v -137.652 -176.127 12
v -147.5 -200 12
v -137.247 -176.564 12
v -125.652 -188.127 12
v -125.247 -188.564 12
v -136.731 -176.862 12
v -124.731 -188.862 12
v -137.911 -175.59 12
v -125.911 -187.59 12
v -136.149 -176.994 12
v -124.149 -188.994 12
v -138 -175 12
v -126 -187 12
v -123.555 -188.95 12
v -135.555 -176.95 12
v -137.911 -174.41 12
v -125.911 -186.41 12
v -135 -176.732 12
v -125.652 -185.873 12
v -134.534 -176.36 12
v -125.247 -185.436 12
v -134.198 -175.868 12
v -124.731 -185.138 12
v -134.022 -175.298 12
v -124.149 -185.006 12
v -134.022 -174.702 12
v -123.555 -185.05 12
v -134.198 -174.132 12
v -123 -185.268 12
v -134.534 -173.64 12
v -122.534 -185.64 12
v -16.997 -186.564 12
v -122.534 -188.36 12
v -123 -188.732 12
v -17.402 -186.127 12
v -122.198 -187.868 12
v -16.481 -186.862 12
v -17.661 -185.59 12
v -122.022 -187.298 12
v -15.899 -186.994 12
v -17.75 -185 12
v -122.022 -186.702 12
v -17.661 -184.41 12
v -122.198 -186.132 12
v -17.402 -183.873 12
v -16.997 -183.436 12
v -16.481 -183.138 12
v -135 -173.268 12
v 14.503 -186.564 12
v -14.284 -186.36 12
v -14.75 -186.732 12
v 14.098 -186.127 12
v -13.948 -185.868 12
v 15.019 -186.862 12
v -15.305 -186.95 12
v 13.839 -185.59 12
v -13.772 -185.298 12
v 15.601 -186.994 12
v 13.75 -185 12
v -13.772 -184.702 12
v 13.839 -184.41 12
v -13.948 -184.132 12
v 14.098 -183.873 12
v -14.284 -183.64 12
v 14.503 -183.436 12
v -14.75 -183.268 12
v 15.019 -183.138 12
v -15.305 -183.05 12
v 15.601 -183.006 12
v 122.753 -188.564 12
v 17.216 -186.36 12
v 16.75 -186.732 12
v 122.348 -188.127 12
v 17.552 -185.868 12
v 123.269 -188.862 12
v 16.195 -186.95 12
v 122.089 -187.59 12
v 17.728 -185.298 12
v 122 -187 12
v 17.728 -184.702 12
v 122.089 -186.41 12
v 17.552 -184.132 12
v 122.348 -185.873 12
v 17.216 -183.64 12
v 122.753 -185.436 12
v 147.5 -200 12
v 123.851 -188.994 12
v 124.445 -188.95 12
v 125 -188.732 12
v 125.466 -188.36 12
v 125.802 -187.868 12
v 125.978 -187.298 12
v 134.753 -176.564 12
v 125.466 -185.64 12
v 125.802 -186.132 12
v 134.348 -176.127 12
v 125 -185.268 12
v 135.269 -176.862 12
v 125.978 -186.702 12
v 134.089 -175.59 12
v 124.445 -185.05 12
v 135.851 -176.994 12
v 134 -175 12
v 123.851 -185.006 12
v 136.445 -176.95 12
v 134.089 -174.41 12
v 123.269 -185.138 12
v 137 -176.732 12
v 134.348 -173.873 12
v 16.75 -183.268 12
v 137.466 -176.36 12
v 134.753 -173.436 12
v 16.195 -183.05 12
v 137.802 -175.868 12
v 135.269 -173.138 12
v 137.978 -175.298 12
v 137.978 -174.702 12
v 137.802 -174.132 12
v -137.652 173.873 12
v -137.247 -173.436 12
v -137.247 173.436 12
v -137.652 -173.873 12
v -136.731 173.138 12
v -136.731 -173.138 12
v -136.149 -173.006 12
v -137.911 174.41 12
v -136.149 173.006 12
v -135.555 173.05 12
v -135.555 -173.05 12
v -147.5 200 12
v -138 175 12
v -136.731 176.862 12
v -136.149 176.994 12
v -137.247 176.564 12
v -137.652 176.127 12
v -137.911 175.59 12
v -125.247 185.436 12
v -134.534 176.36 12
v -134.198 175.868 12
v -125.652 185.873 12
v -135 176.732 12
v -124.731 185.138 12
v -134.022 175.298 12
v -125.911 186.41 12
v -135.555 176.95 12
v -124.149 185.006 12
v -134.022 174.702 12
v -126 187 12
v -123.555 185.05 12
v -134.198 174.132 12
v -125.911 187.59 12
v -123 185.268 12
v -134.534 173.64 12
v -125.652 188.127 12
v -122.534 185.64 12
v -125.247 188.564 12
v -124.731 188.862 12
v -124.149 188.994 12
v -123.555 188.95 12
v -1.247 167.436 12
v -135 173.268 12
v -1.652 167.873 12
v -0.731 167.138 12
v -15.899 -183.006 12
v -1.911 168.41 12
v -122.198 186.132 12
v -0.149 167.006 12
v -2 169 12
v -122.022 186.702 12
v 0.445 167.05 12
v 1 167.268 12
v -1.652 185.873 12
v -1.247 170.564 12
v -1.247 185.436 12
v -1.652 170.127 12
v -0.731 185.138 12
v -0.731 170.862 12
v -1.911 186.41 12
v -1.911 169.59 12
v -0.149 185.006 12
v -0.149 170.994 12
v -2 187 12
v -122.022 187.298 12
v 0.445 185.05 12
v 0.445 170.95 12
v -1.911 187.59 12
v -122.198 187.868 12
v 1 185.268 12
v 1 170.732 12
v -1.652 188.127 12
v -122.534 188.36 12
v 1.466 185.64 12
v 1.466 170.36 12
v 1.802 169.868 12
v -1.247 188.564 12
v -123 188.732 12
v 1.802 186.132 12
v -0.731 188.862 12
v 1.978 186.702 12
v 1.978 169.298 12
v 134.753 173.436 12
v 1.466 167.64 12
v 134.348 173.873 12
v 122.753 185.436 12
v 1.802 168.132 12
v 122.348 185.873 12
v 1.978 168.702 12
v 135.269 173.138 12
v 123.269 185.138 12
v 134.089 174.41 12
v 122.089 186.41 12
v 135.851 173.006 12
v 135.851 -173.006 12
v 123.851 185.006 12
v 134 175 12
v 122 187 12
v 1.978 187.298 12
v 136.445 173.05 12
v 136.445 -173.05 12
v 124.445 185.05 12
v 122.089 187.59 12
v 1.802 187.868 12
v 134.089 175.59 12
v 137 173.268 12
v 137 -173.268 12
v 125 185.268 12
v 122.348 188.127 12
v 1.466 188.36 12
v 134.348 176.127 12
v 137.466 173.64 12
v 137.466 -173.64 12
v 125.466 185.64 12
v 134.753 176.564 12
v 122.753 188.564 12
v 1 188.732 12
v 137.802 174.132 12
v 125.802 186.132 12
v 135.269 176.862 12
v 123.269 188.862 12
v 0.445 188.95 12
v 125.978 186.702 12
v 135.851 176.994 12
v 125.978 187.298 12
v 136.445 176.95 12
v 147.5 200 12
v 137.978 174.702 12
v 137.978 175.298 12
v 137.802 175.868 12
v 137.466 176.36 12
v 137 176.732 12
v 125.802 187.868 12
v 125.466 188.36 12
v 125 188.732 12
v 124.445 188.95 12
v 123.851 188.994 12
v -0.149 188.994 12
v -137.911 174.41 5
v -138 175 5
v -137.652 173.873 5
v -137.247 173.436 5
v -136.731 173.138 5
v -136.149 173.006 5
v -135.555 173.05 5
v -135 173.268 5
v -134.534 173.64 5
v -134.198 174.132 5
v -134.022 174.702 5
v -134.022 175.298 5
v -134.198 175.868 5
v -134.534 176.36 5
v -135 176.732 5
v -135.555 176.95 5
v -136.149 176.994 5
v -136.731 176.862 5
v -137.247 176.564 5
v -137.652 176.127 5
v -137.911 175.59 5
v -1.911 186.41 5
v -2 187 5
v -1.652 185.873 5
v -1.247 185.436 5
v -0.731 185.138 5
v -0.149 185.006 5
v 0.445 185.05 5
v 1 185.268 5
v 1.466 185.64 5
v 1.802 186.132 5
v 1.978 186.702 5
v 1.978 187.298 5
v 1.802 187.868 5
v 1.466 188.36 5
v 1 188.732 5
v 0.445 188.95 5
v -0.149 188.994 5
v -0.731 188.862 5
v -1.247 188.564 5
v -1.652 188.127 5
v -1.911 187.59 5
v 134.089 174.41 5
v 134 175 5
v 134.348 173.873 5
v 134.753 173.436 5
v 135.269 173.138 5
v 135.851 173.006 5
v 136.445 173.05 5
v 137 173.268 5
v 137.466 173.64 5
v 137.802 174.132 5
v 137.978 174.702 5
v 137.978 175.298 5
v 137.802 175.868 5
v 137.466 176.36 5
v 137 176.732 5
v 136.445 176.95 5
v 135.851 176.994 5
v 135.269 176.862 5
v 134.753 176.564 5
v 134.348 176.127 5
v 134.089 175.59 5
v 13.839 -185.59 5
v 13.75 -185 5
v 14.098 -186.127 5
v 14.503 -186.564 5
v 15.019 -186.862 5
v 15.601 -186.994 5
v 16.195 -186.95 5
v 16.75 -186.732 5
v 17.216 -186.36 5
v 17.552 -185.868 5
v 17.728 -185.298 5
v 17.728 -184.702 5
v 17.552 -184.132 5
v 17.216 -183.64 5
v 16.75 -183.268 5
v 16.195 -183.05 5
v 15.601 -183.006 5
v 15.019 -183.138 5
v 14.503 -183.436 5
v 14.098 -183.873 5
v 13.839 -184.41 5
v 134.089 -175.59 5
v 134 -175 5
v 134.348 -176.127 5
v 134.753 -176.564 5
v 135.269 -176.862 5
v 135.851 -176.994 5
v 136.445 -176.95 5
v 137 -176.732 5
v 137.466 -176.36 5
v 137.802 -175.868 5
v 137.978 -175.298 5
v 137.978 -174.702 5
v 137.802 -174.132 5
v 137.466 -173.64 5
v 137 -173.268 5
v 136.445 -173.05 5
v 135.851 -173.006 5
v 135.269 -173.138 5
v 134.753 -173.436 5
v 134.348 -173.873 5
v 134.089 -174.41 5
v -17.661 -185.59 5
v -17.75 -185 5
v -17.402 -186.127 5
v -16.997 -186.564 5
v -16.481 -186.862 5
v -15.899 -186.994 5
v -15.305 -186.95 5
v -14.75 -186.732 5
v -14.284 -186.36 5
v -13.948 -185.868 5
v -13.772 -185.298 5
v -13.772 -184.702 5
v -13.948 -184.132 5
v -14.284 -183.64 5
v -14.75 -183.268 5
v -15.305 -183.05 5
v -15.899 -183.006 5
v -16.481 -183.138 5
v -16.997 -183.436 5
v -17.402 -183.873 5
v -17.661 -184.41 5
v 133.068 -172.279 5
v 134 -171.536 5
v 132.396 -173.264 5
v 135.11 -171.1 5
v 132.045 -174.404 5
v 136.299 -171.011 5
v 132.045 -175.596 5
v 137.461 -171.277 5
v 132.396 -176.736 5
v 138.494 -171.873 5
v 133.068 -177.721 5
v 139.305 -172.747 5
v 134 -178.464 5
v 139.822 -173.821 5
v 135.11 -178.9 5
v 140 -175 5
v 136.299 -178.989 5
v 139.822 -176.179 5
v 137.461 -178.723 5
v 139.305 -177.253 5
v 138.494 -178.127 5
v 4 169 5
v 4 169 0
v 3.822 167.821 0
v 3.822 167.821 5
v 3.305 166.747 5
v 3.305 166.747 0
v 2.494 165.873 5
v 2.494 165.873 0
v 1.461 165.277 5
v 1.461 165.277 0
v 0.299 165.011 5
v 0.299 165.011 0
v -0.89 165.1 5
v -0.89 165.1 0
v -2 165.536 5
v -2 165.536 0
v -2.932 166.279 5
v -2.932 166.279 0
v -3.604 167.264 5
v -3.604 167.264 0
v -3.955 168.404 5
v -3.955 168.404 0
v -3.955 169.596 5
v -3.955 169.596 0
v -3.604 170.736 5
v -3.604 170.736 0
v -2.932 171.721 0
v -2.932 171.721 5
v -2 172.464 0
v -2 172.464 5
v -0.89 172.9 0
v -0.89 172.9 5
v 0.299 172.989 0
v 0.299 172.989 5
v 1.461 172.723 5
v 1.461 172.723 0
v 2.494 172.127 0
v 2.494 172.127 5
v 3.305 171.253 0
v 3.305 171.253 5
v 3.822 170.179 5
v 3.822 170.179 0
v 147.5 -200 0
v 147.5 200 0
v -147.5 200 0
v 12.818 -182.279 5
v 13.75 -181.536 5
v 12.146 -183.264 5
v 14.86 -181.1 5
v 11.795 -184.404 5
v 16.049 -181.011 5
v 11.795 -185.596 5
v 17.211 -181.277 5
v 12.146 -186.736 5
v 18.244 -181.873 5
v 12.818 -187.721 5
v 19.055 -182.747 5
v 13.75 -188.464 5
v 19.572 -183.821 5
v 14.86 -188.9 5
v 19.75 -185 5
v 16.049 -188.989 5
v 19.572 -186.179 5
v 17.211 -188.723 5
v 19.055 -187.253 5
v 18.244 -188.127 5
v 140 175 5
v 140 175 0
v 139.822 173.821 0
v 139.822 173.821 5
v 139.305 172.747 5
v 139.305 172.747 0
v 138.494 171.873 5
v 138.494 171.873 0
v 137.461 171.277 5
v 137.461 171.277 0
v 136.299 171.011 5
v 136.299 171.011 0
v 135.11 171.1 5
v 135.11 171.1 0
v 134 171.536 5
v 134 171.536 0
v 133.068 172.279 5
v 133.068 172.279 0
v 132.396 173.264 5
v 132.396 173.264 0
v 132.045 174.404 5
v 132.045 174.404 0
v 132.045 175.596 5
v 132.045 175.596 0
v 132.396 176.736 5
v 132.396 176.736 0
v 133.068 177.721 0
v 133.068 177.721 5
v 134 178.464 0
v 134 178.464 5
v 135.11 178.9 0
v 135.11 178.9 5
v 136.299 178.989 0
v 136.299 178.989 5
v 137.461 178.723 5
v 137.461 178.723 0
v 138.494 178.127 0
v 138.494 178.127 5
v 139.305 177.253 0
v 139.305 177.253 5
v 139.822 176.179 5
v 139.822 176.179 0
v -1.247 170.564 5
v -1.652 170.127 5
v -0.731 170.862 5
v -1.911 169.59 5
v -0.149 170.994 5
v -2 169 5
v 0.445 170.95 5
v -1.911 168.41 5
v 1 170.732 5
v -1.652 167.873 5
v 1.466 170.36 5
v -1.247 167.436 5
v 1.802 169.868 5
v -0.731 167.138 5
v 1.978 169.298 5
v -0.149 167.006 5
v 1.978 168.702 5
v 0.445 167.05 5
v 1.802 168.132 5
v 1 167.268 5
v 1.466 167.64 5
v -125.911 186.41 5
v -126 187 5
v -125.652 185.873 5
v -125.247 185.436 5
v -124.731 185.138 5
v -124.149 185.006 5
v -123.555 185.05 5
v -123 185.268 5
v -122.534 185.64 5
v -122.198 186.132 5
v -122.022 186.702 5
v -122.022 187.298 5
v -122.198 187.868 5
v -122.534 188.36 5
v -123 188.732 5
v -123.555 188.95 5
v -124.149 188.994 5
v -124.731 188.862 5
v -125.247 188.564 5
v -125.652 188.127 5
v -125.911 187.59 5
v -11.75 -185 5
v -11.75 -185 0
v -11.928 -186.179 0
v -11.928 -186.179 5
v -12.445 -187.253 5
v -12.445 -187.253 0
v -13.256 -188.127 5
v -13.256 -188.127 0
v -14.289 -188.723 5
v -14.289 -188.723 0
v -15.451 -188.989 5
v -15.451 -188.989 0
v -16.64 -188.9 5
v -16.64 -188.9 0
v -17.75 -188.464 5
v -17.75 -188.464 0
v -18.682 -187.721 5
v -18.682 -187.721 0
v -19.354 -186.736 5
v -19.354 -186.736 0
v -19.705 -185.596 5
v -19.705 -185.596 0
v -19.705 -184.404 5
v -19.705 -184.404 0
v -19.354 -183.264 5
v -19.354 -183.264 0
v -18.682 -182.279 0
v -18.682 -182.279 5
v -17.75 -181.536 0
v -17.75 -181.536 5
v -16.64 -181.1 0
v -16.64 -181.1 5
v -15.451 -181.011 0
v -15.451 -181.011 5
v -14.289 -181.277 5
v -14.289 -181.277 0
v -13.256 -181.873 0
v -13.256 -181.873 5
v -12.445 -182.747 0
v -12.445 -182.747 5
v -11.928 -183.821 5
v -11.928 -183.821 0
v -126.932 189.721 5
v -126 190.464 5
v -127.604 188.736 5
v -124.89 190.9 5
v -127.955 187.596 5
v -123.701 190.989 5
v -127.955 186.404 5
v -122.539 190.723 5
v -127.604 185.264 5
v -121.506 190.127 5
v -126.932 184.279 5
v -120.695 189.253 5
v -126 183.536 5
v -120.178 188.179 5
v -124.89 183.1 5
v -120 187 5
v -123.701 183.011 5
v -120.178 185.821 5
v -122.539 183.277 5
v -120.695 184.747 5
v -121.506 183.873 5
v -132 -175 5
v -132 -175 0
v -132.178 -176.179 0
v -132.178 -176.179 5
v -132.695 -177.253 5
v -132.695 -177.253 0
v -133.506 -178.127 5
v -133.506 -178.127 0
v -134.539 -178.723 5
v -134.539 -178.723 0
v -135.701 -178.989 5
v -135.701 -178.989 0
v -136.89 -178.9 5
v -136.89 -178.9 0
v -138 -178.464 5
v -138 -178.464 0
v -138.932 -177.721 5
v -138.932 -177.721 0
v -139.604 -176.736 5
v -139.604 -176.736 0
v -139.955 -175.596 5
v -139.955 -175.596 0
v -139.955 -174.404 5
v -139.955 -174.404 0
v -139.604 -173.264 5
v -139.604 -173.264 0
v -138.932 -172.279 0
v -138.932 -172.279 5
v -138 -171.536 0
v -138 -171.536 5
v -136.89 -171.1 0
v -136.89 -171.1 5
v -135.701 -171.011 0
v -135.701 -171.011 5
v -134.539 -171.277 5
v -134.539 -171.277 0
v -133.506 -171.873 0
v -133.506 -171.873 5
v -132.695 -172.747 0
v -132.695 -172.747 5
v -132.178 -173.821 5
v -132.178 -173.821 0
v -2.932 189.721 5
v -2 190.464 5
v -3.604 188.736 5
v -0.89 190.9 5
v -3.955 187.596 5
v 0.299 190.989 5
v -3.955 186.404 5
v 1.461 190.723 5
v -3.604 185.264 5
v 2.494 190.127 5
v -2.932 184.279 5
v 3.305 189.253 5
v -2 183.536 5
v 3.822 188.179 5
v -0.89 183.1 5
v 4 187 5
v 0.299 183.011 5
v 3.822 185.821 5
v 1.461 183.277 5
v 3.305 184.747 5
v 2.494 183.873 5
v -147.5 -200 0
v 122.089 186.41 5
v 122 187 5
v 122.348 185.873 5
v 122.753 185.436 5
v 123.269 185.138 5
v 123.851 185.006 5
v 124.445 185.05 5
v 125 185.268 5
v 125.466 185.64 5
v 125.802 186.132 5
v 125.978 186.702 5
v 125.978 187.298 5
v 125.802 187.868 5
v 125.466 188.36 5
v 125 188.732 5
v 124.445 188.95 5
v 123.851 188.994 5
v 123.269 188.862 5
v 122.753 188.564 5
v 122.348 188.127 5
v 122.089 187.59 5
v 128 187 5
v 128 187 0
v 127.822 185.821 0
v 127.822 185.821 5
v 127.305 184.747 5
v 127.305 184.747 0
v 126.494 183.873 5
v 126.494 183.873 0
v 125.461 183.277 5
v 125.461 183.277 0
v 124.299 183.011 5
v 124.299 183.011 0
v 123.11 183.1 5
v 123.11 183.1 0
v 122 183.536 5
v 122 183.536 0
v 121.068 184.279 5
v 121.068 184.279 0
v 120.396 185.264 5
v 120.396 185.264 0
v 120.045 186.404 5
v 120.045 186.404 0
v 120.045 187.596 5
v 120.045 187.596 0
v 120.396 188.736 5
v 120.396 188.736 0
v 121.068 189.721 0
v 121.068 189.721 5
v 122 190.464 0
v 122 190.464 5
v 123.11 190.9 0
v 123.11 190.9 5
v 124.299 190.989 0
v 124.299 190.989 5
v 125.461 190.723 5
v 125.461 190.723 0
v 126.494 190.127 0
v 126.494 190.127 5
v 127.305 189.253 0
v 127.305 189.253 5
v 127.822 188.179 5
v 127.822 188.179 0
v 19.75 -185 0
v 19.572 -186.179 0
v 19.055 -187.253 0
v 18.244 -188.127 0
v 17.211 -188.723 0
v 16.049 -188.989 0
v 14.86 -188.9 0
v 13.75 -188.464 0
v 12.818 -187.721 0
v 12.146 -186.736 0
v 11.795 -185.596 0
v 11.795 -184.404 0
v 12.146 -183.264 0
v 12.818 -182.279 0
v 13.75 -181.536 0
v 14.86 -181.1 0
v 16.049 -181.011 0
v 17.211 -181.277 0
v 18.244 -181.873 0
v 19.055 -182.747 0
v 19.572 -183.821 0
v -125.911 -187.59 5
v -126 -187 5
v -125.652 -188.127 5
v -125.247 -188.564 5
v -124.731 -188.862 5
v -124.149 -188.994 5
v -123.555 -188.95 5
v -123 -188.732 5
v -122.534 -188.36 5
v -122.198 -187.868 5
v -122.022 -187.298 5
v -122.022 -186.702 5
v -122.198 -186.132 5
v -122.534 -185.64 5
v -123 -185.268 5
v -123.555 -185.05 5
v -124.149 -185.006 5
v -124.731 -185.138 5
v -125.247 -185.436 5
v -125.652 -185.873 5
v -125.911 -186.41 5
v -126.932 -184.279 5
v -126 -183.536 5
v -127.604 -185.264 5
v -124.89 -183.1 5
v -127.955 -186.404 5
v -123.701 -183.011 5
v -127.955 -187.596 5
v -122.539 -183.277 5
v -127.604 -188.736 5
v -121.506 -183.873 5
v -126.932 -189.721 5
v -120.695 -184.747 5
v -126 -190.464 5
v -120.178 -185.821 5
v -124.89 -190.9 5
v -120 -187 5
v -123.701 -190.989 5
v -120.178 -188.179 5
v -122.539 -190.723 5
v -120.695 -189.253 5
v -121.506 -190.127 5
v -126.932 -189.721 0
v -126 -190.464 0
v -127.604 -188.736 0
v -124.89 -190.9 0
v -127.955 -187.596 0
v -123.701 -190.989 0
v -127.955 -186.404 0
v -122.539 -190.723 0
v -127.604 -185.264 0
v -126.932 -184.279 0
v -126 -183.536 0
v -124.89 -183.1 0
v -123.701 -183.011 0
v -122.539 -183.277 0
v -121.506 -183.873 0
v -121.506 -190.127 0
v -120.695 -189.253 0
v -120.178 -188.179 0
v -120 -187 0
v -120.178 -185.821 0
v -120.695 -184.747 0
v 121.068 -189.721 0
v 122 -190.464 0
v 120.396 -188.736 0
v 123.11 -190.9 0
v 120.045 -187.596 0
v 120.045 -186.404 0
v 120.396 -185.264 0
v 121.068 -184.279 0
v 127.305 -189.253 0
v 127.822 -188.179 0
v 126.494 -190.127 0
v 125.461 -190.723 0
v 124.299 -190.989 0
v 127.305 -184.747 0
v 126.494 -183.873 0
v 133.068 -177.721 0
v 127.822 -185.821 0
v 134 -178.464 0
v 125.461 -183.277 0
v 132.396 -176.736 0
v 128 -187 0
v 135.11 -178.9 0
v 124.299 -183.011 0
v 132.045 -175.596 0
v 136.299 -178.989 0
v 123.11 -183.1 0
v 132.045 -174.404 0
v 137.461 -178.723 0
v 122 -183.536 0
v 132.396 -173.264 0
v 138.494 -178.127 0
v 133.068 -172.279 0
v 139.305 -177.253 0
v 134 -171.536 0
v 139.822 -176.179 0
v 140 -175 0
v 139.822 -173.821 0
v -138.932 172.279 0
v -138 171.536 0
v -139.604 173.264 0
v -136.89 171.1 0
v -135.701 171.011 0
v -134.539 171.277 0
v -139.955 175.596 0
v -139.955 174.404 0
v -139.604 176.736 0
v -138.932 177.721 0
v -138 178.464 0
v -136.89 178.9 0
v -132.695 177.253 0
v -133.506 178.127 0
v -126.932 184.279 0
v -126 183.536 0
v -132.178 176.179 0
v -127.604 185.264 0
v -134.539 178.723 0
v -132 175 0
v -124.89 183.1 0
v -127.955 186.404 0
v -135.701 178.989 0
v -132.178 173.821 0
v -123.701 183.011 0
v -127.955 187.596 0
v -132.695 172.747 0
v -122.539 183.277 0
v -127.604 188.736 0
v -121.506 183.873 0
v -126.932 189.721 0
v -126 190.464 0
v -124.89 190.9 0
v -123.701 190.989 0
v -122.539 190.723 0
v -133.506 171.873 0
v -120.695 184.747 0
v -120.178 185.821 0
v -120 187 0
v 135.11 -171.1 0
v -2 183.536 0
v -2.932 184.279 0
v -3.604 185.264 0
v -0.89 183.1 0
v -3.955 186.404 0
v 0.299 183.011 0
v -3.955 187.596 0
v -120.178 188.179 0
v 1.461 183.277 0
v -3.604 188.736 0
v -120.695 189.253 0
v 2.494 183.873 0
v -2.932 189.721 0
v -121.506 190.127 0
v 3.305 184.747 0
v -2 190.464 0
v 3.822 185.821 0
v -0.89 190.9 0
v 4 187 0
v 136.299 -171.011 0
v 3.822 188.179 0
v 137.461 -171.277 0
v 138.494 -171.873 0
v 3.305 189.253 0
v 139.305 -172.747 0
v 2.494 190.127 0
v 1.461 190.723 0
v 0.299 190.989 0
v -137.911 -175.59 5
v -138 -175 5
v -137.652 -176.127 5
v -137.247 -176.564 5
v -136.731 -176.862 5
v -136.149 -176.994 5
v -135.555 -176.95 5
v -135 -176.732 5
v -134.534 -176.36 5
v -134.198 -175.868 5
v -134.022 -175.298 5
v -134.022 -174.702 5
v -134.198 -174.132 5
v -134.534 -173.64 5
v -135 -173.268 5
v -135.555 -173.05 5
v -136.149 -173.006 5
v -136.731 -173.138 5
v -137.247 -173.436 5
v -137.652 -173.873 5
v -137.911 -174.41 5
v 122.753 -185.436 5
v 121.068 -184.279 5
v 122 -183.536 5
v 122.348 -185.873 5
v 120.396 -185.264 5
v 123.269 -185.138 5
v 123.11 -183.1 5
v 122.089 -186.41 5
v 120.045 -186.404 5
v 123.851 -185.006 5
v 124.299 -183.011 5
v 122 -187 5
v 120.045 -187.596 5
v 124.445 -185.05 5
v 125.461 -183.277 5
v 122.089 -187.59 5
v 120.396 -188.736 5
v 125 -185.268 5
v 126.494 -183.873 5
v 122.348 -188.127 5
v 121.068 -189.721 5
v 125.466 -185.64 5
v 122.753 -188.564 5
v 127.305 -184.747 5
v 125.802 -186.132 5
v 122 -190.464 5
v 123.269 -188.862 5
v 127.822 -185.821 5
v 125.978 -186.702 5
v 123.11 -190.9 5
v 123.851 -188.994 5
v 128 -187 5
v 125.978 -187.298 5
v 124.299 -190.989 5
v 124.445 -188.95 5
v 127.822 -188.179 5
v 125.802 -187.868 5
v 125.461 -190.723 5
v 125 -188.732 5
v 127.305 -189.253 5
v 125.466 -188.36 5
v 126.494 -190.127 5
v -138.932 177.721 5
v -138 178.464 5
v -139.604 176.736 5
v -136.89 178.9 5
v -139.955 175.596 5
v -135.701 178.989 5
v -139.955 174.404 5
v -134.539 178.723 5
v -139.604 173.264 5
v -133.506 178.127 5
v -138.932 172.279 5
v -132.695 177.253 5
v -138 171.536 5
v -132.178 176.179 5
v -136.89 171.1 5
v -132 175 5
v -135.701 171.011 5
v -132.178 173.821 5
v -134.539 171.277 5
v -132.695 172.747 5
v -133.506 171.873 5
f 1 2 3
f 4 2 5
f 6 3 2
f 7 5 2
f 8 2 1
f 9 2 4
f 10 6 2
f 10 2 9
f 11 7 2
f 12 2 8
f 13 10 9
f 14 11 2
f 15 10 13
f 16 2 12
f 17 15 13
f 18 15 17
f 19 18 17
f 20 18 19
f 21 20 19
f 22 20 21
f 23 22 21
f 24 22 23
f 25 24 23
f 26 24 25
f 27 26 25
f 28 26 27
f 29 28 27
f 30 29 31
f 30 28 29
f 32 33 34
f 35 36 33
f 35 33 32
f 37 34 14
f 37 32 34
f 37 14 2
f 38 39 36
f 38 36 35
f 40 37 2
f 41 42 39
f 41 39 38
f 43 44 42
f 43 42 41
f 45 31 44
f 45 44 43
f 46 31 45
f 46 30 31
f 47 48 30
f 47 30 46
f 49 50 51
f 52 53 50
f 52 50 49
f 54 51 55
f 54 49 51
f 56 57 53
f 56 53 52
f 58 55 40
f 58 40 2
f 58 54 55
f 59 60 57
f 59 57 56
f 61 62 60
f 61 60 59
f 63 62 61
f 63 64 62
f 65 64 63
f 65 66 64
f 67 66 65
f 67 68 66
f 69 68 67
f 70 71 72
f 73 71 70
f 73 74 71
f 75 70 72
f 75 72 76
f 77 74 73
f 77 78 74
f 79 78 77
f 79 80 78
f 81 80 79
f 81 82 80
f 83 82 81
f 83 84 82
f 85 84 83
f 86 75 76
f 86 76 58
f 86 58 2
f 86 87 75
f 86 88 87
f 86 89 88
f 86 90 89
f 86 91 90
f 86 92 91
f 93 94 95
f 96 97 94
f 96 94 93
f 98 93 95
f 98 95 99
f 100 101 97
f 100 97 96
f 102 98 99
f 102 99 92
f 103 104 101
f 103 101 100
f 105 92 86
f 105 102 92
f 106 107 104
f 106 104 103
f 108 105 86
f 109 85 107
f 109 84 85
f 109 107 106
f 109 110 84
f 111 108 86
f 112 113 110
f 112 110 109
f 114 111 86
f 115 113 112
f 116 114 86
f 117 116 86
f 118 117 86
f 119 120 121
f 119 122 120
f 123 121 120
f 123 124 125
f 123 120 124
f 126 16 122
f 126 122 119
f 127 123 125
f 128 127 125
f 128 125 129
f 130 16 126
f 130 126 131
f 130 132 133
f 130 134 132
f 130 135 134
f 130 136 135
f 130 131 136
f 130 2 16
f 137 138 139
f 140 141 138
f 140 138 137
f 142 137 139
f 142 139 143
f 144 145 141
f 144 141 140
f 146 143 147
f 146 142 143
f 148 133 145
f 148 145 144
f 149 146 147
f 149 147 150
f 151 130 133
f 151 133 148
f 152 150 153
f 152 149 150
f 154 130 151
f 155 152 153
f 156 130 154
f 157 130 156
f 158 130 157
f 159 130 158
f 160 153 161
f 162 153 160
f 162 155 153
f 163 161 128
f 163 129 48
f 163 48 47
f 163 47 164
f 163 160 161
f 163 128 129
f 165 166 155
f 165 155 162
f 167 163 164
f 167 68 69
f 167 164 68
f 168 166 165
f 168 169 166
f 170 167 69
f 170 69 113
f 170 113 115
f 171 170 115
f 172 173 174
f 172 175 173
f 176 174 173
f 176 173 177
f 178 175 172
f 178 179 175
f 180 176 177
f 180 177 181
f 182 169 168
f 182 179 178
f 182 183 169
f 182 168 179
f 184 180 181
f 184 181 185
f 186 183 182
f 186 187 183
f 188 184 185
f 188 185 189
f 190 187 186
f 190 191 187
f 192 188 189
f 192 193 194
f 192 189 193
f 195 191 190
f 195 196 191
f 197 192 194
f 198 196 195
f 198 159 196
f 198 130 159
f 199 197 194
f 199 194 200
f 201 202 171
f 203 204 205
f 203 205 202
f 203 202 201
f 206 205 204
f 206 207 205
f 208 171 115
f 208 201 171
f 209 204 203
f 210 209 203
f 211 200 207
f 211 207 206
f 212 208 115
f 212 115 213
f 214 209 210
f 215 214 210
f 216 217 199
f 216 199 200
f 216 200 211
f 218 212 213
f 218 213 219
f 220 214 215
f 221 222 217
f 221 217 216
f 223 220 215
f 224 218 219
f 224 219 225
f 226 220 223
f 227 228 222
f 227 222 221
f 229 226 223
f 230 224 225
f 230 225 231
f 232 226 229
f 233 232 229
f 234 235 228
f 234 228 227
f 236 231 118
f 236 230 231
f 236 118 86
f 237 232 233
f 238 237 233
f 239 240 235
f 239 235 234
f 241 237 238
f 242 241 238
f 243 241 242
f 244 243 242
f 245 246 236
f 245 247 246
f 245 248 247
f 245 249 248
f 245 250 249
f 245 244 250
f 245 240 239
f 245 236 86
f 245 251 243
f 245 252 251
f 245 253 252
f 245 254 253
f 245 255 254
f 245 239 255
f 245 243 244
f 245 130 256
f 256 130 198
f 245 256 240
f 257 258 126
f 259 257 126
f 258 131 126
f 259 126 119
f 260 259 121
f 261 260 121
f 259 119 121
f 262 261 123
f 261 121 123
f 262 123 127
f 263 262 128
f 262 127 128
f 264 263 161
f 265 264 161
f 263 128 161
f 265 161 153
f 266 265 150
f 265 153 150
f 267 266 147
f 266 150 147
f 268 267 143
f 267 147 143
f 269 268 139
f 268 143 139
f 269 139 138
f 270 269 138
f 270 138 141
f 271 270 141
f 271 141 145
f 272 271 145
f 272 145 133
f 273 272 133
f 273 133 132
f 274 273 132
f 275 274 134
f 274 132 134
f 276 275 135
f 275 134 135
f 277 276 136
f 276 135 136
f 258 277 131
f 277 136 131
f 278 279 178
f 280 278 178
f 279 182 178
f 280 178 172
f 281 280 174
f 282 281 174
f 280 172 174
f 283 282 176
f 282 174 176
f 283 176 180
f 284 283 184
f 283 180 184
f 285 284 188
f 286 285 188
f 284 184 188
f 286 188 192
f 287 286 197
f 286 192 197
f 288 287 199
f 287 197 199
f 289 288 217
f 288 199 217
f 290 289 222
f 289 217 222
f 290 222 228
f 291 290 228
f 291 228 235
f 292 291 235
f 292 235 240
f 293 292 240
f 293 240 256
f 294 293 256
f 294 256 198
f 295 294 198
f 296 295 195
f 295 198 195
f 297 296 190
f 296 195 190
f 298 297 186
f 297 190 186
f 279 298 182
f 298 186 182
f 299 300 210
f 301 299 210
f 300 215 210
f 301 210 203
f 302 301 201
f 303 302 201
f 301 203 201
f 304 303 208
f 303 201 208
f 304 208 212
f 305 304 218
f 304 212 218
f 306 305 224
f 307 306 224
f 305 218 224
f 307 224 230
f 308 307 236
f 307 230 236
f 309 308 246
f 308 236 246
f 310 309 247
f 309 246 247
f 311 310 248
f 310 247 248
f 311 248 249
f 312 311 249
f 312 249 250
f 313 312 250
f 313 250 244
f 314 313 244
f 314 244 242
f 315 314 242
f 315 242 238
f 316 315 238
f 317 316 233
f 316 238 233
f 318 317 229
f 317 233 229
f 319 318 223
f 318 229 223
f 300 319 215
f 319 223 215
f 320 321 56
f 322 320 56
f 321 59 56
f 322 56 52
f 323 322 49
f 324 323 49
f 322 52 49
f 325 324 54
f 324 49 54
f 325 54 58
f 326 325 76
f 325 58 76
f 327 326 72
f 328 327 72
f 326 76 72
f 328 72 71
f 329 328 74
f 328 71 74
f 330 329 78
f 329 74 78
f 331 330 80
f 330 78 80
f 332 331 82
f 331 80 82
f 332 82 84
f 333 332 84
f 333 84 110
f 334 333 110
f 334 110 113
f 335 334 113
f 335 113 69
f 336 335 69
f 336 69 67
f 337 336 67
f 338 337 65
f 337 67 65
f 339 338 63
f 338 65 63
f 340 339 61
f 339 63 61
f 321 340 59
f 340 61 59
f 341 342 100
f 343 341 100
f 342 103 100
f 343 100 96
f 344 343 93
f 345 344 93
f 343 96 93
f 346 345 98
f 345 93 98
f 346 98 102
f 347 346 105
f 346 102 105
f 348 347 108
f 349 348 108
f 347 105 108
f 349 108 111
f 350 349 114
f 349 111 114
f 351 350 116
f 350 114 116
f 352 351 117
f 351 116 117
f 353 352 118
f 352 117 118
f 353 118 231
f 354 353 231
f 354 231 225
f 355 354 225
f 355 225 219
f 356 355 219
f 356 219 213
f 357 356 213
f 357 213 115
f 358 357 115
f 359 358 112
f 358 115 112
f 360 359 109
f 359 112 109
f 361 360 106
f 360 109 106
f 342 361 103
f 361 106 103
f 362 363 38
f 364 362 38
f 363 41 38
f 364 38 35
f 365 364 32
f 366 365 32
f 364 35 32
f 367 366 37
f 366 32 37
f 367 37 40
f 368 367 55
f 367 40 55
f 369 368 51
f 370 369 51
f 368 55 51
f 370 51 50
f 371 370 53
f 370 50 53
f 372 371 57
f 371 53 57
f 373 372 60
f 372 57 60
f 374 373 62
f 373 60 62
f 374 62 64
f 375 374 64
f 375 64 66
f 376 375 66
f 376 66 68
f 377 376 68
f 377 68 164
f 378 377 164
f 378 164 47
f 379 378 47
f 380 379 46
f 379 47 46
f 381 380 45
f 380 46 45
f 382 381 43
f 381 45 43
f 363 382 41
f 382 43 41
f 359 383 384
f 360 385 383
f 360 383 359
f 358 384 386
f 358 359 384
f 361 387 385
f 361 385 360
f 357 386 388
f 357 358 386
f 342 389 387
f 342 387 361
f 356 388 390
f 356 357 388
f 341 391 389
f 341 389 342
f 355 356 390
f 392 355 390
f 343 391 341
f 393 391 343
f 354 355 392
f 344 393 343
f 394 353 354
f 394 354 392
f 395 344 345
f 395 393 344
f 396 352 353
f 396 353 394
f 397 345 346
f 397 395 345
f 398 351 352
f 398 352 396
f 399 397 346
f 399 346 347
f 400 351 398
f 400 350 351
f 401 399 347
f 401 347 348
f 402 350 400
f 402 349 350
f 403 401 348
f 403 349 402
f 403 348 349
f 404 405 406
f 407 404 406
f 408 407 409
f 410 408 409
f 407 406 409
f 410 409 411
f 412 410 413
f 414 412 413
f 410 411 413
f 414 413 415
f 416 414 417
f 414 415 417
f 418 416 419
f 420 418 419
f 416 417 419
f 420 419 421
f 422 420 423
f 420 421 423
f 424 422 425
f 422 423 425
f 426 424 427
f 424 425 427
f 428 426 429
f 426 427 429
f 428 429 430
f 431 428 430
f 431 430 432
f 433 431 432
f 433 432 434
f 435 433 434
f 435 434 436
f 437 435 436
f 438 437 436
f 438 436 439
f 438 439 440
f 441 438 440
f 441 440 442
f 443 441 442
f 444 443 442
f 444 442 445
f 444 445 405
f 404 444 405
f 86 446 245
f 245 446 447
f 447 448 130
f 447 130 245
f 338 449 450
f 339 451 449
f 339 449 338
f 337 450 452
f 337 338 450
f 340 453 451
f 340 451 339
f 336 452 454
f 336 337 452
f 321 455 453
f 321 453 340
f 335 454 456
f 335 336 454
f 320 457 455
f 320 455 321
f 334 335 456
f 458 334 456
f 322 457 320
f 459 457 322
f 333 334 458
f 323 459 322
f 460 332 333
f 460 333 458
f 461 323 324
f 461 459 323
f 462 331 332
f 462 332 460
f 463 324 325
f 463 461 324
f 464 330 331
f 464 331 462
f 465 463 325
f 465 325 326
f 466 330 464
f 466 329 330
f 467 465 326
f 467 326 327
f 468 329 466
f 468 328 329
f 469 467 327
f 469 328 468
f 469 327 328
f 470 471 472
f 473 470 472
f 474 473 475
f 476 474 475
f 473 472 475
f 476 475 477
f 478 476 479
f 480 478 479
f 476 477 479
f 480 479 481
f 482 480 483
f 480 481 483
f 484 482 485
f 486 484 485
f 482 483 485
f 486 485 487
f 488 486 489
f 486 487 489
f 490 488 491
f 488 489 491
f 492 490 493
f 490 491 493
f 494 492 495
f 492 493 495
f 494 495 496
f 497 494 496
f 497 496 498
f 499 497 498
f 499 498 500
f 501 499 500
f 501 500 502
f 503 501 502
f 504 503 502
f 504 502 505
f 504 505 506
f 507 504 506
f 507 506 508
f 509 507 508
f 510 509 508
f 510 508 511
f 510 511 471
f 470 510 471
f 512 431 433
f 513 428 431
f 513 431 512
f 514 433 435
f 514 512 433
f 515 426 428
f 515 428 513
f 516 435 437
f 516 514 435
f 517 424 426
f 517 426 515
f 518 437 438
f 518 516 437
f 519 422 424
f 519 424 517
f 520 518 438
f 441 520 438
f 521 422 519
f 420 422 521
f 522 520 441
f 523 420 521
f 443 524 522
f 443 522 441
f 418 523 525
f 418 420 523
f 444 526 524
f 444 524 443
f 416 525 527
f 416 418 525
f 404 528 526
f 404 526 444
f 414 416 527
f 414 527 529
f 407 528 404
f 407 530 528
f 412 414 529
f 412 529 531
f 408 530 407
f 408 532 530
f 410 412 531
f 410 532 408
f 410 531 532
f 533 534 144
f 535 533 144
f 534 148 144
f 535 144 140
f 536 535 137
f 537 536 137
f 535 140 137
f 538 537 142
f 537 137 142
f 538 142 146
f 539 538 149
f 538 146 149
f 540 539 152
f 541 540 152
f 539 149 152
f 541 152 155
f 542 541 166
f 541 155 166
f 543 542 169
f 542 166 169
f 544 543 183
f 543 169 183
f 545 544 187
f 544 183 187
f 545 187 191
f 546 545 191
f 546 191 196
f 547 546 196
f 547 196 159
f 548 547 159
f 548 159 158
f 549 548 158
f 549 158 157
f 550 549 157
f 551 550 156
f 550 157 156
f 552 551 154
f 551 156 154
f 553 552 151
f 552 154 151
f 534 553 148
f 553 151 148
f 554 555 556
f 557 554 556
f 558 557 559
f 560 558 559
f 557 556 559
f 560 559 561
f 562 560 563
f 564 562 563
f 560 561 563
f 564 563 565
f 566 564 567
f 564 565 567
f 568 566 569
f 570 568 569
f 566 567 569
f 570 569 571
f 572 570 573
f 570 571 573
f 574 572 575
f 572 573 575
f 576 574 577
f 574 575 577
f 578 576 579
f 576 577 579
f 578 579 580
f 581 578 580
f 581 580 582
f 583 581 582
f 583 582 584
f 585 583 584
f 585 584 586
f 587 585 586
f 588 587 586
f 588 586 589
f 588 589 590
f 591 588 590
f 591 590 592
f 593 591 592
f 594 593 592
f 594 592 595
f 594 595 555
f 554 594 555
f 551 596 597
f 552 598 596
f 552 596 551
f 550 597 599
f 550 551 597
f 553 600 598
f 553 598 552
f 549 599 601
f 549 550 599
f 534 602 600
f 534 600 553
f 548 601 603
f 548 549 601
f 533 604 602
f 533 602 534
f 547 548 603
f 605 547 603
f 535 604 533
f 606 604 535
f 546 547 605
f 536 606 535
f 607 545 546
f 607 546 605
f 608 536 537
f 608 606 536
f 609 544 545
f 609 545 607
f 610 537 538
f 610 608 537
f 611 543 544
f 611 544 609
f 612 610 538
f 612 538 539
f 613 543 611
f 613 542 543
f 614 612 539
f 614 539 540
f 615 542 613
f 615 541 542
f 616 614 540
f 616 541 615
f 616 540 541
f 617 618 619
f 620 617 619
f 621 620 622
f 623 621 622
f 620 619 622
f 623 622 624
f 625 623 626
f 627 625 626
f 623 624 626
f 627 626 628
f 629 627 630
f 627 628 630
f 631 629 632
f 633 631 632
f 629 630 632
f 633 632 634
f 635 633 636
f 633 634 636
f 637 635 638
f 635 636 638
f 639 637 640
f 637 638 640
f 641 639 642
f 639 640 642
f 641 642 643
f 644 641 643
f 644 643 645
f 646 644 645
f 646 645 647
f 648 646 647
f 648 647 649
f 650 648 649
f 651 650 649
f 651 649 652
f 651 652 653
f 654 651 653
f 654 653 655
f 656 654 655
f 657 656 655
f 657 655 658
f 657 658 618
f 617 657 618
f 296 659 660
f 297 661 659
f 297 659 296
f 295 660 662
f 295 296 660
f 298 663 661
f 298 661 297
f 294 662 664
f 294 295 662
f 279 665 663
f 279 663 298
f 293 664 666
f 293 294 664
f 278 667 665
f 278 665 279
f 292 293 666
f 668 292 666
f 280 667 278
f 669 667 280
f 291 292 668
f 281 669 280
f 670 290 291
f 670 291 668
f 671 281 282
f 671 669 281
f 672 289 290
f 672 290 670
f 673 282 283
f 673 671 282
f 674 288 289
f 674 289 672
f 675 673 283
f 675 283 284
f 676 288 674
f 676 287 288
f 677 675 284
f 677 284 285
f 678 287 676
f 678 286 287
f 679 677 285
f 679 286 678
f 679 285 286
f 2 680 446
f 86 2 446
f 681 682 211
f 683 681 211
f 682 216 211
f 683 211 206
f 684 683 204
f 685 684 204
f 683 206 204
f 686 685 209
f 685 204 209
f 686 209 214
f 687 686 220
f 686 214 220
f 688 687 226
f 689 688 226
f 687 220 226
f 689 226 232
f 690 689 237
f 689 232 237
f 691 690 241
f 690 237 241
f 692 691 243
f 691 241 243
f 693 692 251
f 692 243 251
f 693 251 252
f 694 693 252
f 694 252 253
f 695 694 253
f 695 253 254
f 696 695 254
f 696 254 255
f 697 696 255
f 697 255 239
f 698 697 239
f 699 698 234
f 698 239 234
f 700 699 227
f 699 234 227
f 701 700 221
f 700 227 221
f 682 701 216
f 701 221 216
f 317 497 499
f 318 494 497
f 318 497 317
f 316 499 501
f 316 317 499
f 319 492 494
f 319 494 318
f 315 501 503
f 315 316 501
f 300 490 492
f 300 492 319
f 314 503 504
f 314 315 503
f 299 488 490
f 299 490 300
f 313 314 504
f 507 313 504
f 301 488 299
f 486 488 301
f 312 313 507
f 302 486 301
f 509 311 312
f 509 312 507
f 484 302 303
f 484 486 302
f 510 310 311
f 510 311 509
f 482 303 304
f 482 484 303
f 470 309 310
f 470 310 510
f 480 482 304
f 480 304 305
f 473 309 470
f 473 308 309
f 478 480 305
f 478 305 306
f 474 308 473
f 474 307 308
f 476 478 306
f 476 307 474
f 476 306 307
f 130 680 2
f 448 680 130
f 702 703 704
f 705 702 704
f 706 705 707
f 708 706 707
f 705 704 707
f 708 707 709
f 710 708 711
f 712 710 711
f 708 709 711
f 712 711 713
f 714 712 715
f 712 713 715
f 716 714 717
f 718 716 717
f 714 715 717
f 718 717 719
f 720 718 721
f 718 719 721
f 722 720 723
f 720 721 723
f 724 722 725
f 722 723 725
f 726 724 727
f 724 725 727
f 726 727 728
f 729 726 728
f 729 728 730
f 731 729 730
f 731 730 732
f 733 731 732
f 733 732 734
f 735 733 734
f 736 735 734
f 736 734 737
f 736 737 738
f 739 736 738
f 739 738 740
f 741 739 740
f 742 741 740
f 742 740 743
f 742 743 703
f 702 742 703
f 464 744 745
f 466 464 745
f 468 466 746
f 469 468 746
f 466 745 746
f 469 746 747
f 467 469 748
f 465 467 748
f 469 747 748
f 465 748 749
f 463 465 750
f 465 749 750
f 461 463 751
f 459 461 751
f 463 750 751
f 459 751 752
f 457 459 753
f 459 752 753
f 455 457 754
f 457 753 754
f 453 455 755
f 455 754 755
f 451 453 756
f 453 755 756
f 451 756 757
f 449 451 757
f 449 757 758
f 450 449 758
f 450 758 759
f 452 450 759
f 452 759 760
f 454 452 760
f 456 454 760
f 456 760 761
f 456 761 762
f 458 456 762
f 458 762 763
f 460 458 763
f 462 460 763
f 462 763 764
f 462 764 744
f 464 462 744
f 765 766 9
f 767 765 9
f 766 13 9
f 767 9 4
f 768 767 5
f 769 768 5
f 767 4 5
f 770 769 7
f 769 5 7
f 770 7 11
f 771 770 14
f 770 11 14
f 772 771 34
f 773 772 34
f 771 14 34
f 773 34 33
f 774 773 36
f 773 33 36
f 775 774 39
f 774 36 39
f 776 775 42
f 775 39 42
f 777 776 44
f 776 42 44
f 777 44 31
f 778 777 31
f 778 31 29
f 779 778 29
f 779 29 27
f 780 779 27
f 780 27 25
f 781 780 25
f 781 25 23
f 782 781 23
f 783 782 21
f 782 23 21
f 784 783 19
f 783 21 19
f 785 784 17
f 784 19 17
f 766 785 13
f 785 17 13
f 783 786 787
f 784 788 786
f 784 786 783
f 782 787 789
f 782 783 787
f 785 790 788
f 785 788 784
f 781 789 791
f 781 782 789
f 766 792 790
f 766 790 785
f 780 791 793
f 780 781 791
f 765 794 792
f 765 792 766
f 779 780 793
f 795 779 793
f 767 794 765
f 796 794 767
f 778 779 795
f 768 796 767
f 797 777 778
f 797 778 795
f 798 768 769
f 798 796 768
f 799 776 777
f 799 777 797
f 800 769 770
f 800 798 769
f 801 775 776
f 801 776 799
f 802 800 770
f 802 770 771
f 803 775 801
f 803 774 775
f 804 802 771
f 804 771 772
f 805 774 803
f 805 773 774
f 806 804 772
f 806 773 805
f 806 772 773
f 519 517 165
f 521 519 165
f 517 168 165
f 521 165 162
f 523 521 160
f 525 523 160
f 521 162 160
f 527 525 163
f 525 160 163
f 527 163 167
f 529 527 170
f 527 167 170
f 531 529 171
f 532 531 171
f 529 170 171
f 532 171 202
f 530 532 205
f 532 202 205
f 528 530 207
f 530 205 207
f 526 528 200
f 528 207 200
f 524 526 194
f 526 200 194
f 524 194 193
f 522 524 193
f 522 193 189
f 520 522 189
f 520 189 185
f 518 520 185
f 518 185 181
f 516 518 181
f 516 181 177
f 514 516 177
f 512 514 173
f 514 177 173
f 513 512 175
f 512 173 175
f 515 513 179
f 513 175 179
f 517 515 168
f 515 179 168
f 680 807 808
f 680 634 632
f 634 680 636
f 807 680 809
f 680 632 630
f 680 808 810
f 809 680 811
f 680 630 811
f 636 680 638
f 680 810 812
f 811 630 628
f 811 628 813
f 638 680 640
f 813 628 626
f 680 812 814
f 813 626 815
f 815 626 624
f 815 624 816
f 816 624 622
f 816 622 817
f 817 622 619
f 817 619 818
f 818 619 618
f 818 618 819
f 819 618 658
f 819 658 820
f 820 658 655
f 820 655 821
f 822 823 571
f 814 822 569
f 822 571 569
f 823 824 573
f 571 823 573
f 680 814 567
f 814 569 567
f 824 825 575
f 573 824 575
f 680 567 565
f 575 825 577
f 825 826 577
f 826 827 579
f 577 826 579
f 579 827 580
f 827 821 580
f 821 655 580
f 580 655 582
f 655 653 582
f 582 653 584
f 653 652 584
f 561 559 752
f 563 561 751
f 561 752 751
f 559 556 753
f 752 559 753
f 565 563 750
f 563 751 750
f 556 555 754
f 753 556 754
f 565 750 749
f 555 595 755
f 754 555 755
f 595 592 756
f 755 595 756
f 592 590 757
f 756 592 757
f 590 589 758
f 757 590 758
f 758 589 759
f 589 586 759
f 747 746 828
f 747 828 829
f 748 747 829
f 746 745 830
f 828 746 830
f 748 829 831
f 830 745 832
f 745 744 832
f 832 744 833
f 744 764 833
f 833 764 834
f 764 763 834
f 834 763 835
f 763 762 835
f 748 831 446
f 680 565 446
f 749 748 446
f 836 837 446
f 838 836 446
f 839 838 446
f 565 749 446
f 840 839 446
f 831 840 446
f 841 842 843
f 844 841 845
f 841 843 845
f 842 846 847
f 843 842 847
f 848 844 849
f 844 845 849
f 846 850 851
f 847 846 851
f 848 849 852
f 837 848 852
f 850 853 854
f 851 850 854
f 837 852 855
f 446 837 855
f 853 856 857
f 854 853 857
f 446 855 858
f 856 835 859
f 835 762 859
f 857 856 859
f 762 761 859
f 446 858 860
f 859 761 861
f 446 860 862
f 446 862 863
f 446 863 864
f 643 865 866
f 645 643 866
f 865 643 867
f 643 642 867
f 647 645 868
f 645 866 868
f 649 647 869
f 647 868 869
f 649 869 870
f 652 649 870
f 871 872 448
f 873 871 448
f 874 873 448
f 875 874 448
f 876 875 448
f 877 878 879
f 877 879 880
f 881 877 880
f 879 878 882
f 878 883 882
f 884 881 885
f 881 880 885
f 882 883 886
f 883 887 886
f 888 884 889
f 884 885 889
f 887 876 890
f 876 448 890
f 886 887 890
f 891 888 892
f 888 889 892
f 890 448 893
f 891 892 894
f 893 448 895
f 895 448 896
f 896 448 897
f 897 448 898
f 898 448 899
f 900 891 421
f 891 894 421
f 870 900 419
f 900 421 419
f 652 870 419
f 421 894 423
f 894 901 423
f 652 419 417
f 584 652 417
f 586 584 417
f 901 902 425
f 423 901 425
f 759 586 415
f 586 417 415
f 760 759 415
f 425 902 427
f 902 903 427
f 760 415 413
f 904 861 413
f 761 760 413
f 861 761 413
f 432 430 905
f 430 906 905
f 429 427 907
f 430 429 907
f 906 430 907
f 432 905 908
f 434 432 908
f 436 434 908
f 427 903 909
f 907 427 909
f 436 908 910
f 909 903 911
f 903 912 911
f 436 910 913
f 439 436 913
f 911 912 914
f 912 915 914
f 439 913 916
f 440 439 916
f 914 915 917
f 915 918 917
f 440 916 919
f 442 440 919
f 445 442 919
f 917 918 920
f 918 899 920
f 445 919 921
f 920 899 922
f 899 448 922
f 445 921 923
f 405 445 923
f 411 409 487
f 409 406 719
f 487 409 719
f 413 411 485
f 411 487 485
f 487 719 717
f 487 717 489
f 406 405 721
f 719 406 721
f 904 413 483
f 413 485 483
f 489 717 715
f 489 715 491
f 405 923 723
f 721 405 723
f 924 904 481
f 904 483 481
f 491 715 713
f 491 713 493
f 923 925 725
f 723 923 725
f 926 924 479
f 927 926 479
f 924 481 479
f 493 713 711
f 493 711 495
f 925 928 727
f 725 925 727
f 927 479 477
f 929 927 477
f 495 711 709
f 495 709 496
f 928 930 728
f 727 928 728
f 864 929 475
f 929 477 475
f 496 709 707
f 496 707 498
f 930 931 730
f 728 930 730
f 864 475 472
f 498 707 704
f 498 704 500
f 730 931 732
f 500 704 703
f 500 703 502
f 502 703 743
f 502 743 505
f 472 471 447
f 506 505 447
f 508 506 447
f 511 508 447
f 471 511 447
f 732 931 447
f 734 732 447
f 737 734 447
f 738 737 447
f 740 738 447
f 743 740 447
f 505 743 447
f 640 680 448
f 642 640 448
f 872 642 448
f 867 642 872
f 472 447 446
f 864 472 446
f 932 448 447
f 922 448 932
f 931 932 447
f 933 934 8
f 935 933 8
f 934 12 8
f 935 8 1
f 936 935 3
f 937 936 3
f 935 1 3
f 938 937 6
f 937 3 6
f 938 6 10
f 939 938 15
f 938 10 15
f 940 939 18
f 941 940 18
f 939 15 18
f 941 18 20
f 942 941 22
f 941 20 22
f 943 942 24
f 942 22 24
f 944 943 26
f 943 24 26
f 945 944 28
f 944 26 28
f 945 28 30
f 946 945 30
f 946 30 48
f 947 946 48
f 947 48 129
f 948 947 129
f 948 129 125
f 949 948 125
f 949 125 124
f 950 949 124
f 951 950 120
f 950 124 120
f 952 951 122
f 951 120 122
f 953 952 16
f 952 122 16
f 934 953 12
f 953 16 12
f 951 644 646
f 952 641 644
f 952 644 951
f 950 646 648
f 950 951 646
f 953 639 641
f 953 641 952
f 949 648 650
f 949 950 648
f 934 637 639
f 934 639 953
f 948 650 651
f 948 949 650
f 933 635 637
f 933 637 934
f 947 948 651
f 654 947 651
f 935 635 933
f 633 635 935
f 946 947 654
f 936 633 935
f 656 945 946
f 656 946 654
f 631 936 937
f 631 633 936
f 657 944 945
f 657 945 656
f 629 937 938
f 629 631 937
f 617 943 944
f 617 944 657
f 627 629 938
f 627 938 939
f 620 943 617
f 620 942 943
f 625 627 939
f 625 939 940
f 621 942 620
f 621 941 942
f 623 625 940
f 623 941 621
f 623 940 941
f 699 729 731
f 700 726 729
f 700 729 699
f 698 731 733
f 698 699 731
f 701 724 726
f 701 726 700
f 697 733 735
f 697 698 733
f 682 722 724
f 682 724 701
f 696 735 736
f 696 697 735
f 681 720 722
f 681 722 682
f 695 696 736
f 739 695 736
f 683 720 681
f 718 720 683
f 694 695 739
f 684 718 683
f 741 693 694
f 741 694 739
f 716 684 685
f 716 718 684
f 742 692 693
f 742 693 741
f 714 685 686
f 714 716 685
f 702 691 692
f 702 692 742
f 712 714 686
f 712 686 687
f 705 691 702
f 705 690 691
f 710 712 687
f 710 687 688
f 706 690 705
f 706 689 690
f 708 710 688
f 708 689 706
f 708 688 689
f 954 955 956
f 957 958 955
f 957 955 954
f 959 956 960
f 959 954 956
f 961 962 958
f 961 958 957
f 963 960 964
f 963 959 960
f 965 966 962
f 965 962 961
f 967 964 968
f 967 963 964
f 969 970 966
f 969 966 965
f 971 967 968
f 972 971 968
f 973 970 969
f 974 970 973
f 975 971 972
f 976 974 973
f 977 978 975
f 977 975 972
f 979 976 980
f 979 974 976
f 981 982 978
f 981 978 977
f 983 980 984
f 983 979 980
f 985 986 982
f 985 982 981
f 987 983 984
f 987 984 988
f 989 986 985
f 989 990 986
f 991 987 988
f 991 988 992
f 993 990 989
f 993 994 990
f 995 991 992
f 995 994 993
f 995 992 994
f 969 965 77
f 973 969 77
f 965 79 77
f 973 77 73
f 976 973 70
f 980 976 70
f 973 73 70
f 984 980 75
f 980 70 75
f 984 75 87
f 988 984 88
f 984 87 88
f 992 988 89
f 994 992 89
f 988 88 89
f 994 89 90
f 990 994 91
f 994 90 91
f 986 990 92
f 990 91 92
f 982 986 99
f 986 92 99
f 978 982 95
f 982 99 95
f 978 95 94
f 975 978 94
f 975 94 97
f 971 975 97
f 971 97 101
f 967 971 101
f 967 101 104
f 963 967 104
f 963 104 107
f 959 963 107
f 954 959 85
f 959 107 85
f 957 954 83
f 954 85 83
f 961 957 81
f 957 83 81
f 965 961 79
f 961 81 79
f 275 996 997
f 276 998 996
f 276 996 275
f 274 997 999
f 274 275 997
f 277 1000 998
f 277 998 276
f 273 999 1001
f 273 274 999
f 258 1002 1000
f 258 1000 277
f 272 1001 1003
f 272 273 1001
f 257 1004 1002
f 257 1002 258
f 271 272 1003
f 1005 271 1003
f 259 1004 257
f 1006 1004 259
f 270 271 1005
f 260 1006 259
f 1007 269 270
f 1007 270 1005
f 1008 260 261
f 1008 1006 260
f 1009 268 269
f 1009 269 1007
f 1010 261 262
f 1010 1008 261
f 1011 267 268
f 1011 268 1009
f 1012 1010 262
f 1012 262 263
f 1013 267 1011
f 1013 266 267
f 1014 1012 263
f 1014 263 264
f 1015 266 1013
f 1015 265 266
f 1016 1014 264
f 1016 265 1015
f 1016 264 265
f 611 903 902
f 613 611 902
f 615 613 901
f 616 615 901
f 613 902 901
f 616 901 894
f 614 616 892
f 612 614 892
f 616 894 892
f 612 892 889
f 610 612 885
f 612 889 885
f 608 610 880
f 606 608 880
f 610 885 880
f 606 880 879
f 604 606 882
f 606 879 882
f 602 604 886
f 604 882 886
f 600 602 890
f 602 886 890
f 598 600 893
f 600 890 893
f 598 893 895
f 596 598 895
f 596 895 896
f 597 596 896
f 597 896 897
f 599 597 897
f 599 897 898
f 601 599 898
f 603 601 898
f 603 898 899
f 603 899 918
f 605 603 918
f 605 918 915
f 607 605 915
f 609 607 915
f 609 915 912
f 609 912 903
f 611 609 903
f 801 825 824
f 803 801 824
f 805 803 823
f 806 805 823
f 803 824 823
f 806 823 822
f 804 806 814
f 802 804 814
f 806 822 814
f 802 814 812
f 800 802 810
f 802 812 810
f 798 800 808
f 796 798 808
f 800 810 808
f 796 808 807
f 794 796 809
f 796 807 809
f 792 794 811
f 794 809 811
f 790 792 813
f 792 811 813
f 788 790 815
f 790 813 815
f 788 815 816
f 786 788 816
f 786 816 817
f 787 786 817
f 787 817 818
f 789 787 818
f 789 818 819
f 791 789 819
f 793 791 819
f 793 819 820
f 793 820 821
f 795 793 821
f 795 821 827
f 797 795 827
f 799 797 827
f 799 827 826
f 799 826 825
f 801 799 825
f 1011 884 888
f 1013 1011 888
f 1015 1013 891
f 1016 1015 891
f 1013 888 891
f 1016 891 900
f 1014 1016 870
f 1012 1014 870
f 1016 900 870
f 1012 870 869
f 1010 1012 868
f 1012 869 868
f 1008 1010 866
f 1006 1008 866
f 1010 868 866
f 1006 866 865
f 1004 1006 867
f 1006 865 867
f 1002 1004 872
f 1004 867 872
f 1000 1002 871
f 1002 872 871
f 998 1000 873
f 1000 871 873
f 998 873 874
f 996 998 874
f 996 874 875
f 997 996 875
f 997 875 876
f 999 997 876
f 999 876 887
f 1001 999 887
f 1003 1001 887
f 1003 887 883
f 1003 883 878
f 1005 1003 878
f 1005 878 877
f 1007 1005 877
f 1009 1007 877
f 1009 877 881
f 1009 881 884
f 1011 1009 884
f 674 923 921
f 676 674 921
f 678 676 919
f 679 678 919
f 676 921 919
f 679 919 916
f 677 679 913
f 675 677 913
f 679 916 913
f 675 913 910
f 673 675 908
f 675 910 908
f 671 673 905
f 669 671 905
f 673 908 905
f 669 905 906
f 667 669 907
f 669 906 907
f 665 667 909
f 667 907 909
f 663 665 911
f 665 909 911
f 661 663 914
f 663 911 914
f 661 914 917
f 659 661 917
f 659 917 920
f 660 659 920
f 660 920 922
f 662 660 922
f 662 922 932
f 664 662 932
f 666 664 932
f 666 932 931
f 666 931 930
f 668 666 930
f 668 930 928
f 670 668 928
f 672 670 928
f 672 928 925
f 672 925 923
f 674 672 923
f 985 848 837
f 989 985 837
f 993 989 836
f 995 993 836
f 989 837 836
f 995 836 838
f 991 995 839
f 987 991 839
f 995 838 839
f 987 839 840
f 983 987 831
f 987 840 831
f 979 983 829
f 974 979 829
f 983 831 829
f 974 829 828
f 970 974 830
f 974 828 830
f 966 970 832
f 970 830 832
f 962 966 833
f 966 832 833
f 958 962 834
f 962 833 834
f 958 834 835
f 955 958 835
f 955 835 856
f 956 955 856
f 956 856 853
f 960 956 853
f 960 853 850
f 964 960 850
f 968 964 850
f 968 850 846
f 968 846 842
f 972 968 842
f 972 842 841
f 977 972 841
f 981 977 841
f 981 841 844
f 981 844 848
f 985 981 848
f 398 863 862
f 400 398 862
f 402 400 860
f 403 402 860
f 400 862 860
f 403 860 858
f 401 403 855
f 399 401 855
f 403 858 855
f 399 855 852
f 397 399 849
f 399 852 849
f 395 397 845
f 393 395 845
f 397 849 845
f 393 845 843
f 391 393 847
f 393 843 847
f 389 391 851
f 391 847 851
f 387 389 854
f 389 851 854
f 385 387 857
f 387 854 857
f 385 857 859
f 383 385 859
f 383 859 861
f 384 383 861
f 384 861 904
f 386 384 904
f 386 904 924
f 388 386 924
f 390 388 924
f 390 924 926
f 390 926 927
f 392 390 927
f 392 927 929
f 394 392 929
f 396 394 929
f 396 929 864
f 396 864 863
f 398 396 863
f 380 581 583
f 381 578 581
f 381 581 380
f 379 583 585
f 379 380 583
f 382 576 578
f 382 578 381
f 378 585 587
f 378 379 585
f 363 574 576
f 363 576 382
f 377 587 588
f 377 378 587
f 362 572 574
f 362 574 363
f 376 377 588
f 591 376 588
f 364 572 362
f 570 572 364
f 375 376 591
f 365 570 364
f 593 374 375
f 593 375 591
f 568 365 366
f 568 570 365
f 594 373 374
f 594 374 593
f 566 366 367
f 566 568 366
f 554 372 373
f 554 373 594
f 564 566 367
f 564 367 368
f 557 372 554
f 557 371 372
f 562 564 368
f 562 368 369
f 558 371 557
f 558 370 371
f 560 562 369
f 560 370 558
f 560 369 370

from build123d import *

# Parameters (mm, degrees)
F0_W           = 295
F0_H           = 400
F1_DEPTH       = 12
F3_D           = 4
F3_CBORE_D     = 8
F3_CBORE_DEPTH = 5


with BuildPart() as f1:
    # F0 (on Top) → F1 (new body)
    with BuildSketch(Plane.XY):
        Rectangle(F0_W, F0_H)
    extrude(amount=F1_DEPTH)

    # F3 (through all)
    with Locations(Plane(origin=(0, 0, 0), x_dir=(1, 0, 0), z_dir=(0, 0, -1))):
        with Locations((136, 175), (124, 187), (15.75, 185), (-15.75, 185), (-124, 187), (-136, 175), (-136, -175), (-124, -187), (0, -187), (0, -169), (124, -187), (136, -175)):
            CounterBoreHole(F3_D / 2, F3_CBORE_D / 2, F3_CBORE_DEPTH)


solid = f1.part
